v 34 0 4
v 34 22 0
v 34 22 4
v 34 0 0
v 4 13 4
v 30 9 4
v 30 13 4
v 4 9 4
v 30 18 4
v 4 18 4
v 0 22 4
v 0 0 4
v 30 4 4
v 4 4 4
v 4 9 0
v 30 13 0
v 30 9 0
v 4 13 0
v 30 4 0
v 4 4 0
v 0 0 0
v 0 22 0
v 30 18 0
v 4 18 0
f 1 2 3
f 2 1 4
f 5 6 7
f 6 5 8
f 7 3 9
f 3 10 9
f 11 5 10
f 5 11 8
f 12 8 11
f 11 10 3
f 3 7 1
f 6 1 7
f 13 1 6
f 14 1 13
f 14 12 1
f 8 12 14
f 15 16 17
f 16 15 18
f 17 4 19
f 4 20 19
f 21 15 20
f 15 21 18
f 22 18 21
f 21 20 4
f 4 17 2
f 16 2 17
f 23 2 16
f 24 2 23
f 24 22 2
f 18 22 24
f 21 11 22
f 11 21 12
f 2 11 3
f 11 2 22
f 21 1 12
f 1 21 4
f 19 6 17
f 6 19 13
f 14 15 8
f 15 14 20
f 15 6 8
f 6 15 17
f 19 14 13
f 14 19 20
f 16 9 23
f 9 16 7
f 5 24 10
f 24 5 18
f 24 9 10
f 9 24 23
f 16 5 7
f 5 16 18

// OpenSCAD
difference() {
	cube([26+8, 4+5+4+5+4, 4]);
	translate([4, 4, -1]) cube([26, 5, 6]);
	translate([4, 4+5+4, -1]) cube([26, 5, 6]);
}
